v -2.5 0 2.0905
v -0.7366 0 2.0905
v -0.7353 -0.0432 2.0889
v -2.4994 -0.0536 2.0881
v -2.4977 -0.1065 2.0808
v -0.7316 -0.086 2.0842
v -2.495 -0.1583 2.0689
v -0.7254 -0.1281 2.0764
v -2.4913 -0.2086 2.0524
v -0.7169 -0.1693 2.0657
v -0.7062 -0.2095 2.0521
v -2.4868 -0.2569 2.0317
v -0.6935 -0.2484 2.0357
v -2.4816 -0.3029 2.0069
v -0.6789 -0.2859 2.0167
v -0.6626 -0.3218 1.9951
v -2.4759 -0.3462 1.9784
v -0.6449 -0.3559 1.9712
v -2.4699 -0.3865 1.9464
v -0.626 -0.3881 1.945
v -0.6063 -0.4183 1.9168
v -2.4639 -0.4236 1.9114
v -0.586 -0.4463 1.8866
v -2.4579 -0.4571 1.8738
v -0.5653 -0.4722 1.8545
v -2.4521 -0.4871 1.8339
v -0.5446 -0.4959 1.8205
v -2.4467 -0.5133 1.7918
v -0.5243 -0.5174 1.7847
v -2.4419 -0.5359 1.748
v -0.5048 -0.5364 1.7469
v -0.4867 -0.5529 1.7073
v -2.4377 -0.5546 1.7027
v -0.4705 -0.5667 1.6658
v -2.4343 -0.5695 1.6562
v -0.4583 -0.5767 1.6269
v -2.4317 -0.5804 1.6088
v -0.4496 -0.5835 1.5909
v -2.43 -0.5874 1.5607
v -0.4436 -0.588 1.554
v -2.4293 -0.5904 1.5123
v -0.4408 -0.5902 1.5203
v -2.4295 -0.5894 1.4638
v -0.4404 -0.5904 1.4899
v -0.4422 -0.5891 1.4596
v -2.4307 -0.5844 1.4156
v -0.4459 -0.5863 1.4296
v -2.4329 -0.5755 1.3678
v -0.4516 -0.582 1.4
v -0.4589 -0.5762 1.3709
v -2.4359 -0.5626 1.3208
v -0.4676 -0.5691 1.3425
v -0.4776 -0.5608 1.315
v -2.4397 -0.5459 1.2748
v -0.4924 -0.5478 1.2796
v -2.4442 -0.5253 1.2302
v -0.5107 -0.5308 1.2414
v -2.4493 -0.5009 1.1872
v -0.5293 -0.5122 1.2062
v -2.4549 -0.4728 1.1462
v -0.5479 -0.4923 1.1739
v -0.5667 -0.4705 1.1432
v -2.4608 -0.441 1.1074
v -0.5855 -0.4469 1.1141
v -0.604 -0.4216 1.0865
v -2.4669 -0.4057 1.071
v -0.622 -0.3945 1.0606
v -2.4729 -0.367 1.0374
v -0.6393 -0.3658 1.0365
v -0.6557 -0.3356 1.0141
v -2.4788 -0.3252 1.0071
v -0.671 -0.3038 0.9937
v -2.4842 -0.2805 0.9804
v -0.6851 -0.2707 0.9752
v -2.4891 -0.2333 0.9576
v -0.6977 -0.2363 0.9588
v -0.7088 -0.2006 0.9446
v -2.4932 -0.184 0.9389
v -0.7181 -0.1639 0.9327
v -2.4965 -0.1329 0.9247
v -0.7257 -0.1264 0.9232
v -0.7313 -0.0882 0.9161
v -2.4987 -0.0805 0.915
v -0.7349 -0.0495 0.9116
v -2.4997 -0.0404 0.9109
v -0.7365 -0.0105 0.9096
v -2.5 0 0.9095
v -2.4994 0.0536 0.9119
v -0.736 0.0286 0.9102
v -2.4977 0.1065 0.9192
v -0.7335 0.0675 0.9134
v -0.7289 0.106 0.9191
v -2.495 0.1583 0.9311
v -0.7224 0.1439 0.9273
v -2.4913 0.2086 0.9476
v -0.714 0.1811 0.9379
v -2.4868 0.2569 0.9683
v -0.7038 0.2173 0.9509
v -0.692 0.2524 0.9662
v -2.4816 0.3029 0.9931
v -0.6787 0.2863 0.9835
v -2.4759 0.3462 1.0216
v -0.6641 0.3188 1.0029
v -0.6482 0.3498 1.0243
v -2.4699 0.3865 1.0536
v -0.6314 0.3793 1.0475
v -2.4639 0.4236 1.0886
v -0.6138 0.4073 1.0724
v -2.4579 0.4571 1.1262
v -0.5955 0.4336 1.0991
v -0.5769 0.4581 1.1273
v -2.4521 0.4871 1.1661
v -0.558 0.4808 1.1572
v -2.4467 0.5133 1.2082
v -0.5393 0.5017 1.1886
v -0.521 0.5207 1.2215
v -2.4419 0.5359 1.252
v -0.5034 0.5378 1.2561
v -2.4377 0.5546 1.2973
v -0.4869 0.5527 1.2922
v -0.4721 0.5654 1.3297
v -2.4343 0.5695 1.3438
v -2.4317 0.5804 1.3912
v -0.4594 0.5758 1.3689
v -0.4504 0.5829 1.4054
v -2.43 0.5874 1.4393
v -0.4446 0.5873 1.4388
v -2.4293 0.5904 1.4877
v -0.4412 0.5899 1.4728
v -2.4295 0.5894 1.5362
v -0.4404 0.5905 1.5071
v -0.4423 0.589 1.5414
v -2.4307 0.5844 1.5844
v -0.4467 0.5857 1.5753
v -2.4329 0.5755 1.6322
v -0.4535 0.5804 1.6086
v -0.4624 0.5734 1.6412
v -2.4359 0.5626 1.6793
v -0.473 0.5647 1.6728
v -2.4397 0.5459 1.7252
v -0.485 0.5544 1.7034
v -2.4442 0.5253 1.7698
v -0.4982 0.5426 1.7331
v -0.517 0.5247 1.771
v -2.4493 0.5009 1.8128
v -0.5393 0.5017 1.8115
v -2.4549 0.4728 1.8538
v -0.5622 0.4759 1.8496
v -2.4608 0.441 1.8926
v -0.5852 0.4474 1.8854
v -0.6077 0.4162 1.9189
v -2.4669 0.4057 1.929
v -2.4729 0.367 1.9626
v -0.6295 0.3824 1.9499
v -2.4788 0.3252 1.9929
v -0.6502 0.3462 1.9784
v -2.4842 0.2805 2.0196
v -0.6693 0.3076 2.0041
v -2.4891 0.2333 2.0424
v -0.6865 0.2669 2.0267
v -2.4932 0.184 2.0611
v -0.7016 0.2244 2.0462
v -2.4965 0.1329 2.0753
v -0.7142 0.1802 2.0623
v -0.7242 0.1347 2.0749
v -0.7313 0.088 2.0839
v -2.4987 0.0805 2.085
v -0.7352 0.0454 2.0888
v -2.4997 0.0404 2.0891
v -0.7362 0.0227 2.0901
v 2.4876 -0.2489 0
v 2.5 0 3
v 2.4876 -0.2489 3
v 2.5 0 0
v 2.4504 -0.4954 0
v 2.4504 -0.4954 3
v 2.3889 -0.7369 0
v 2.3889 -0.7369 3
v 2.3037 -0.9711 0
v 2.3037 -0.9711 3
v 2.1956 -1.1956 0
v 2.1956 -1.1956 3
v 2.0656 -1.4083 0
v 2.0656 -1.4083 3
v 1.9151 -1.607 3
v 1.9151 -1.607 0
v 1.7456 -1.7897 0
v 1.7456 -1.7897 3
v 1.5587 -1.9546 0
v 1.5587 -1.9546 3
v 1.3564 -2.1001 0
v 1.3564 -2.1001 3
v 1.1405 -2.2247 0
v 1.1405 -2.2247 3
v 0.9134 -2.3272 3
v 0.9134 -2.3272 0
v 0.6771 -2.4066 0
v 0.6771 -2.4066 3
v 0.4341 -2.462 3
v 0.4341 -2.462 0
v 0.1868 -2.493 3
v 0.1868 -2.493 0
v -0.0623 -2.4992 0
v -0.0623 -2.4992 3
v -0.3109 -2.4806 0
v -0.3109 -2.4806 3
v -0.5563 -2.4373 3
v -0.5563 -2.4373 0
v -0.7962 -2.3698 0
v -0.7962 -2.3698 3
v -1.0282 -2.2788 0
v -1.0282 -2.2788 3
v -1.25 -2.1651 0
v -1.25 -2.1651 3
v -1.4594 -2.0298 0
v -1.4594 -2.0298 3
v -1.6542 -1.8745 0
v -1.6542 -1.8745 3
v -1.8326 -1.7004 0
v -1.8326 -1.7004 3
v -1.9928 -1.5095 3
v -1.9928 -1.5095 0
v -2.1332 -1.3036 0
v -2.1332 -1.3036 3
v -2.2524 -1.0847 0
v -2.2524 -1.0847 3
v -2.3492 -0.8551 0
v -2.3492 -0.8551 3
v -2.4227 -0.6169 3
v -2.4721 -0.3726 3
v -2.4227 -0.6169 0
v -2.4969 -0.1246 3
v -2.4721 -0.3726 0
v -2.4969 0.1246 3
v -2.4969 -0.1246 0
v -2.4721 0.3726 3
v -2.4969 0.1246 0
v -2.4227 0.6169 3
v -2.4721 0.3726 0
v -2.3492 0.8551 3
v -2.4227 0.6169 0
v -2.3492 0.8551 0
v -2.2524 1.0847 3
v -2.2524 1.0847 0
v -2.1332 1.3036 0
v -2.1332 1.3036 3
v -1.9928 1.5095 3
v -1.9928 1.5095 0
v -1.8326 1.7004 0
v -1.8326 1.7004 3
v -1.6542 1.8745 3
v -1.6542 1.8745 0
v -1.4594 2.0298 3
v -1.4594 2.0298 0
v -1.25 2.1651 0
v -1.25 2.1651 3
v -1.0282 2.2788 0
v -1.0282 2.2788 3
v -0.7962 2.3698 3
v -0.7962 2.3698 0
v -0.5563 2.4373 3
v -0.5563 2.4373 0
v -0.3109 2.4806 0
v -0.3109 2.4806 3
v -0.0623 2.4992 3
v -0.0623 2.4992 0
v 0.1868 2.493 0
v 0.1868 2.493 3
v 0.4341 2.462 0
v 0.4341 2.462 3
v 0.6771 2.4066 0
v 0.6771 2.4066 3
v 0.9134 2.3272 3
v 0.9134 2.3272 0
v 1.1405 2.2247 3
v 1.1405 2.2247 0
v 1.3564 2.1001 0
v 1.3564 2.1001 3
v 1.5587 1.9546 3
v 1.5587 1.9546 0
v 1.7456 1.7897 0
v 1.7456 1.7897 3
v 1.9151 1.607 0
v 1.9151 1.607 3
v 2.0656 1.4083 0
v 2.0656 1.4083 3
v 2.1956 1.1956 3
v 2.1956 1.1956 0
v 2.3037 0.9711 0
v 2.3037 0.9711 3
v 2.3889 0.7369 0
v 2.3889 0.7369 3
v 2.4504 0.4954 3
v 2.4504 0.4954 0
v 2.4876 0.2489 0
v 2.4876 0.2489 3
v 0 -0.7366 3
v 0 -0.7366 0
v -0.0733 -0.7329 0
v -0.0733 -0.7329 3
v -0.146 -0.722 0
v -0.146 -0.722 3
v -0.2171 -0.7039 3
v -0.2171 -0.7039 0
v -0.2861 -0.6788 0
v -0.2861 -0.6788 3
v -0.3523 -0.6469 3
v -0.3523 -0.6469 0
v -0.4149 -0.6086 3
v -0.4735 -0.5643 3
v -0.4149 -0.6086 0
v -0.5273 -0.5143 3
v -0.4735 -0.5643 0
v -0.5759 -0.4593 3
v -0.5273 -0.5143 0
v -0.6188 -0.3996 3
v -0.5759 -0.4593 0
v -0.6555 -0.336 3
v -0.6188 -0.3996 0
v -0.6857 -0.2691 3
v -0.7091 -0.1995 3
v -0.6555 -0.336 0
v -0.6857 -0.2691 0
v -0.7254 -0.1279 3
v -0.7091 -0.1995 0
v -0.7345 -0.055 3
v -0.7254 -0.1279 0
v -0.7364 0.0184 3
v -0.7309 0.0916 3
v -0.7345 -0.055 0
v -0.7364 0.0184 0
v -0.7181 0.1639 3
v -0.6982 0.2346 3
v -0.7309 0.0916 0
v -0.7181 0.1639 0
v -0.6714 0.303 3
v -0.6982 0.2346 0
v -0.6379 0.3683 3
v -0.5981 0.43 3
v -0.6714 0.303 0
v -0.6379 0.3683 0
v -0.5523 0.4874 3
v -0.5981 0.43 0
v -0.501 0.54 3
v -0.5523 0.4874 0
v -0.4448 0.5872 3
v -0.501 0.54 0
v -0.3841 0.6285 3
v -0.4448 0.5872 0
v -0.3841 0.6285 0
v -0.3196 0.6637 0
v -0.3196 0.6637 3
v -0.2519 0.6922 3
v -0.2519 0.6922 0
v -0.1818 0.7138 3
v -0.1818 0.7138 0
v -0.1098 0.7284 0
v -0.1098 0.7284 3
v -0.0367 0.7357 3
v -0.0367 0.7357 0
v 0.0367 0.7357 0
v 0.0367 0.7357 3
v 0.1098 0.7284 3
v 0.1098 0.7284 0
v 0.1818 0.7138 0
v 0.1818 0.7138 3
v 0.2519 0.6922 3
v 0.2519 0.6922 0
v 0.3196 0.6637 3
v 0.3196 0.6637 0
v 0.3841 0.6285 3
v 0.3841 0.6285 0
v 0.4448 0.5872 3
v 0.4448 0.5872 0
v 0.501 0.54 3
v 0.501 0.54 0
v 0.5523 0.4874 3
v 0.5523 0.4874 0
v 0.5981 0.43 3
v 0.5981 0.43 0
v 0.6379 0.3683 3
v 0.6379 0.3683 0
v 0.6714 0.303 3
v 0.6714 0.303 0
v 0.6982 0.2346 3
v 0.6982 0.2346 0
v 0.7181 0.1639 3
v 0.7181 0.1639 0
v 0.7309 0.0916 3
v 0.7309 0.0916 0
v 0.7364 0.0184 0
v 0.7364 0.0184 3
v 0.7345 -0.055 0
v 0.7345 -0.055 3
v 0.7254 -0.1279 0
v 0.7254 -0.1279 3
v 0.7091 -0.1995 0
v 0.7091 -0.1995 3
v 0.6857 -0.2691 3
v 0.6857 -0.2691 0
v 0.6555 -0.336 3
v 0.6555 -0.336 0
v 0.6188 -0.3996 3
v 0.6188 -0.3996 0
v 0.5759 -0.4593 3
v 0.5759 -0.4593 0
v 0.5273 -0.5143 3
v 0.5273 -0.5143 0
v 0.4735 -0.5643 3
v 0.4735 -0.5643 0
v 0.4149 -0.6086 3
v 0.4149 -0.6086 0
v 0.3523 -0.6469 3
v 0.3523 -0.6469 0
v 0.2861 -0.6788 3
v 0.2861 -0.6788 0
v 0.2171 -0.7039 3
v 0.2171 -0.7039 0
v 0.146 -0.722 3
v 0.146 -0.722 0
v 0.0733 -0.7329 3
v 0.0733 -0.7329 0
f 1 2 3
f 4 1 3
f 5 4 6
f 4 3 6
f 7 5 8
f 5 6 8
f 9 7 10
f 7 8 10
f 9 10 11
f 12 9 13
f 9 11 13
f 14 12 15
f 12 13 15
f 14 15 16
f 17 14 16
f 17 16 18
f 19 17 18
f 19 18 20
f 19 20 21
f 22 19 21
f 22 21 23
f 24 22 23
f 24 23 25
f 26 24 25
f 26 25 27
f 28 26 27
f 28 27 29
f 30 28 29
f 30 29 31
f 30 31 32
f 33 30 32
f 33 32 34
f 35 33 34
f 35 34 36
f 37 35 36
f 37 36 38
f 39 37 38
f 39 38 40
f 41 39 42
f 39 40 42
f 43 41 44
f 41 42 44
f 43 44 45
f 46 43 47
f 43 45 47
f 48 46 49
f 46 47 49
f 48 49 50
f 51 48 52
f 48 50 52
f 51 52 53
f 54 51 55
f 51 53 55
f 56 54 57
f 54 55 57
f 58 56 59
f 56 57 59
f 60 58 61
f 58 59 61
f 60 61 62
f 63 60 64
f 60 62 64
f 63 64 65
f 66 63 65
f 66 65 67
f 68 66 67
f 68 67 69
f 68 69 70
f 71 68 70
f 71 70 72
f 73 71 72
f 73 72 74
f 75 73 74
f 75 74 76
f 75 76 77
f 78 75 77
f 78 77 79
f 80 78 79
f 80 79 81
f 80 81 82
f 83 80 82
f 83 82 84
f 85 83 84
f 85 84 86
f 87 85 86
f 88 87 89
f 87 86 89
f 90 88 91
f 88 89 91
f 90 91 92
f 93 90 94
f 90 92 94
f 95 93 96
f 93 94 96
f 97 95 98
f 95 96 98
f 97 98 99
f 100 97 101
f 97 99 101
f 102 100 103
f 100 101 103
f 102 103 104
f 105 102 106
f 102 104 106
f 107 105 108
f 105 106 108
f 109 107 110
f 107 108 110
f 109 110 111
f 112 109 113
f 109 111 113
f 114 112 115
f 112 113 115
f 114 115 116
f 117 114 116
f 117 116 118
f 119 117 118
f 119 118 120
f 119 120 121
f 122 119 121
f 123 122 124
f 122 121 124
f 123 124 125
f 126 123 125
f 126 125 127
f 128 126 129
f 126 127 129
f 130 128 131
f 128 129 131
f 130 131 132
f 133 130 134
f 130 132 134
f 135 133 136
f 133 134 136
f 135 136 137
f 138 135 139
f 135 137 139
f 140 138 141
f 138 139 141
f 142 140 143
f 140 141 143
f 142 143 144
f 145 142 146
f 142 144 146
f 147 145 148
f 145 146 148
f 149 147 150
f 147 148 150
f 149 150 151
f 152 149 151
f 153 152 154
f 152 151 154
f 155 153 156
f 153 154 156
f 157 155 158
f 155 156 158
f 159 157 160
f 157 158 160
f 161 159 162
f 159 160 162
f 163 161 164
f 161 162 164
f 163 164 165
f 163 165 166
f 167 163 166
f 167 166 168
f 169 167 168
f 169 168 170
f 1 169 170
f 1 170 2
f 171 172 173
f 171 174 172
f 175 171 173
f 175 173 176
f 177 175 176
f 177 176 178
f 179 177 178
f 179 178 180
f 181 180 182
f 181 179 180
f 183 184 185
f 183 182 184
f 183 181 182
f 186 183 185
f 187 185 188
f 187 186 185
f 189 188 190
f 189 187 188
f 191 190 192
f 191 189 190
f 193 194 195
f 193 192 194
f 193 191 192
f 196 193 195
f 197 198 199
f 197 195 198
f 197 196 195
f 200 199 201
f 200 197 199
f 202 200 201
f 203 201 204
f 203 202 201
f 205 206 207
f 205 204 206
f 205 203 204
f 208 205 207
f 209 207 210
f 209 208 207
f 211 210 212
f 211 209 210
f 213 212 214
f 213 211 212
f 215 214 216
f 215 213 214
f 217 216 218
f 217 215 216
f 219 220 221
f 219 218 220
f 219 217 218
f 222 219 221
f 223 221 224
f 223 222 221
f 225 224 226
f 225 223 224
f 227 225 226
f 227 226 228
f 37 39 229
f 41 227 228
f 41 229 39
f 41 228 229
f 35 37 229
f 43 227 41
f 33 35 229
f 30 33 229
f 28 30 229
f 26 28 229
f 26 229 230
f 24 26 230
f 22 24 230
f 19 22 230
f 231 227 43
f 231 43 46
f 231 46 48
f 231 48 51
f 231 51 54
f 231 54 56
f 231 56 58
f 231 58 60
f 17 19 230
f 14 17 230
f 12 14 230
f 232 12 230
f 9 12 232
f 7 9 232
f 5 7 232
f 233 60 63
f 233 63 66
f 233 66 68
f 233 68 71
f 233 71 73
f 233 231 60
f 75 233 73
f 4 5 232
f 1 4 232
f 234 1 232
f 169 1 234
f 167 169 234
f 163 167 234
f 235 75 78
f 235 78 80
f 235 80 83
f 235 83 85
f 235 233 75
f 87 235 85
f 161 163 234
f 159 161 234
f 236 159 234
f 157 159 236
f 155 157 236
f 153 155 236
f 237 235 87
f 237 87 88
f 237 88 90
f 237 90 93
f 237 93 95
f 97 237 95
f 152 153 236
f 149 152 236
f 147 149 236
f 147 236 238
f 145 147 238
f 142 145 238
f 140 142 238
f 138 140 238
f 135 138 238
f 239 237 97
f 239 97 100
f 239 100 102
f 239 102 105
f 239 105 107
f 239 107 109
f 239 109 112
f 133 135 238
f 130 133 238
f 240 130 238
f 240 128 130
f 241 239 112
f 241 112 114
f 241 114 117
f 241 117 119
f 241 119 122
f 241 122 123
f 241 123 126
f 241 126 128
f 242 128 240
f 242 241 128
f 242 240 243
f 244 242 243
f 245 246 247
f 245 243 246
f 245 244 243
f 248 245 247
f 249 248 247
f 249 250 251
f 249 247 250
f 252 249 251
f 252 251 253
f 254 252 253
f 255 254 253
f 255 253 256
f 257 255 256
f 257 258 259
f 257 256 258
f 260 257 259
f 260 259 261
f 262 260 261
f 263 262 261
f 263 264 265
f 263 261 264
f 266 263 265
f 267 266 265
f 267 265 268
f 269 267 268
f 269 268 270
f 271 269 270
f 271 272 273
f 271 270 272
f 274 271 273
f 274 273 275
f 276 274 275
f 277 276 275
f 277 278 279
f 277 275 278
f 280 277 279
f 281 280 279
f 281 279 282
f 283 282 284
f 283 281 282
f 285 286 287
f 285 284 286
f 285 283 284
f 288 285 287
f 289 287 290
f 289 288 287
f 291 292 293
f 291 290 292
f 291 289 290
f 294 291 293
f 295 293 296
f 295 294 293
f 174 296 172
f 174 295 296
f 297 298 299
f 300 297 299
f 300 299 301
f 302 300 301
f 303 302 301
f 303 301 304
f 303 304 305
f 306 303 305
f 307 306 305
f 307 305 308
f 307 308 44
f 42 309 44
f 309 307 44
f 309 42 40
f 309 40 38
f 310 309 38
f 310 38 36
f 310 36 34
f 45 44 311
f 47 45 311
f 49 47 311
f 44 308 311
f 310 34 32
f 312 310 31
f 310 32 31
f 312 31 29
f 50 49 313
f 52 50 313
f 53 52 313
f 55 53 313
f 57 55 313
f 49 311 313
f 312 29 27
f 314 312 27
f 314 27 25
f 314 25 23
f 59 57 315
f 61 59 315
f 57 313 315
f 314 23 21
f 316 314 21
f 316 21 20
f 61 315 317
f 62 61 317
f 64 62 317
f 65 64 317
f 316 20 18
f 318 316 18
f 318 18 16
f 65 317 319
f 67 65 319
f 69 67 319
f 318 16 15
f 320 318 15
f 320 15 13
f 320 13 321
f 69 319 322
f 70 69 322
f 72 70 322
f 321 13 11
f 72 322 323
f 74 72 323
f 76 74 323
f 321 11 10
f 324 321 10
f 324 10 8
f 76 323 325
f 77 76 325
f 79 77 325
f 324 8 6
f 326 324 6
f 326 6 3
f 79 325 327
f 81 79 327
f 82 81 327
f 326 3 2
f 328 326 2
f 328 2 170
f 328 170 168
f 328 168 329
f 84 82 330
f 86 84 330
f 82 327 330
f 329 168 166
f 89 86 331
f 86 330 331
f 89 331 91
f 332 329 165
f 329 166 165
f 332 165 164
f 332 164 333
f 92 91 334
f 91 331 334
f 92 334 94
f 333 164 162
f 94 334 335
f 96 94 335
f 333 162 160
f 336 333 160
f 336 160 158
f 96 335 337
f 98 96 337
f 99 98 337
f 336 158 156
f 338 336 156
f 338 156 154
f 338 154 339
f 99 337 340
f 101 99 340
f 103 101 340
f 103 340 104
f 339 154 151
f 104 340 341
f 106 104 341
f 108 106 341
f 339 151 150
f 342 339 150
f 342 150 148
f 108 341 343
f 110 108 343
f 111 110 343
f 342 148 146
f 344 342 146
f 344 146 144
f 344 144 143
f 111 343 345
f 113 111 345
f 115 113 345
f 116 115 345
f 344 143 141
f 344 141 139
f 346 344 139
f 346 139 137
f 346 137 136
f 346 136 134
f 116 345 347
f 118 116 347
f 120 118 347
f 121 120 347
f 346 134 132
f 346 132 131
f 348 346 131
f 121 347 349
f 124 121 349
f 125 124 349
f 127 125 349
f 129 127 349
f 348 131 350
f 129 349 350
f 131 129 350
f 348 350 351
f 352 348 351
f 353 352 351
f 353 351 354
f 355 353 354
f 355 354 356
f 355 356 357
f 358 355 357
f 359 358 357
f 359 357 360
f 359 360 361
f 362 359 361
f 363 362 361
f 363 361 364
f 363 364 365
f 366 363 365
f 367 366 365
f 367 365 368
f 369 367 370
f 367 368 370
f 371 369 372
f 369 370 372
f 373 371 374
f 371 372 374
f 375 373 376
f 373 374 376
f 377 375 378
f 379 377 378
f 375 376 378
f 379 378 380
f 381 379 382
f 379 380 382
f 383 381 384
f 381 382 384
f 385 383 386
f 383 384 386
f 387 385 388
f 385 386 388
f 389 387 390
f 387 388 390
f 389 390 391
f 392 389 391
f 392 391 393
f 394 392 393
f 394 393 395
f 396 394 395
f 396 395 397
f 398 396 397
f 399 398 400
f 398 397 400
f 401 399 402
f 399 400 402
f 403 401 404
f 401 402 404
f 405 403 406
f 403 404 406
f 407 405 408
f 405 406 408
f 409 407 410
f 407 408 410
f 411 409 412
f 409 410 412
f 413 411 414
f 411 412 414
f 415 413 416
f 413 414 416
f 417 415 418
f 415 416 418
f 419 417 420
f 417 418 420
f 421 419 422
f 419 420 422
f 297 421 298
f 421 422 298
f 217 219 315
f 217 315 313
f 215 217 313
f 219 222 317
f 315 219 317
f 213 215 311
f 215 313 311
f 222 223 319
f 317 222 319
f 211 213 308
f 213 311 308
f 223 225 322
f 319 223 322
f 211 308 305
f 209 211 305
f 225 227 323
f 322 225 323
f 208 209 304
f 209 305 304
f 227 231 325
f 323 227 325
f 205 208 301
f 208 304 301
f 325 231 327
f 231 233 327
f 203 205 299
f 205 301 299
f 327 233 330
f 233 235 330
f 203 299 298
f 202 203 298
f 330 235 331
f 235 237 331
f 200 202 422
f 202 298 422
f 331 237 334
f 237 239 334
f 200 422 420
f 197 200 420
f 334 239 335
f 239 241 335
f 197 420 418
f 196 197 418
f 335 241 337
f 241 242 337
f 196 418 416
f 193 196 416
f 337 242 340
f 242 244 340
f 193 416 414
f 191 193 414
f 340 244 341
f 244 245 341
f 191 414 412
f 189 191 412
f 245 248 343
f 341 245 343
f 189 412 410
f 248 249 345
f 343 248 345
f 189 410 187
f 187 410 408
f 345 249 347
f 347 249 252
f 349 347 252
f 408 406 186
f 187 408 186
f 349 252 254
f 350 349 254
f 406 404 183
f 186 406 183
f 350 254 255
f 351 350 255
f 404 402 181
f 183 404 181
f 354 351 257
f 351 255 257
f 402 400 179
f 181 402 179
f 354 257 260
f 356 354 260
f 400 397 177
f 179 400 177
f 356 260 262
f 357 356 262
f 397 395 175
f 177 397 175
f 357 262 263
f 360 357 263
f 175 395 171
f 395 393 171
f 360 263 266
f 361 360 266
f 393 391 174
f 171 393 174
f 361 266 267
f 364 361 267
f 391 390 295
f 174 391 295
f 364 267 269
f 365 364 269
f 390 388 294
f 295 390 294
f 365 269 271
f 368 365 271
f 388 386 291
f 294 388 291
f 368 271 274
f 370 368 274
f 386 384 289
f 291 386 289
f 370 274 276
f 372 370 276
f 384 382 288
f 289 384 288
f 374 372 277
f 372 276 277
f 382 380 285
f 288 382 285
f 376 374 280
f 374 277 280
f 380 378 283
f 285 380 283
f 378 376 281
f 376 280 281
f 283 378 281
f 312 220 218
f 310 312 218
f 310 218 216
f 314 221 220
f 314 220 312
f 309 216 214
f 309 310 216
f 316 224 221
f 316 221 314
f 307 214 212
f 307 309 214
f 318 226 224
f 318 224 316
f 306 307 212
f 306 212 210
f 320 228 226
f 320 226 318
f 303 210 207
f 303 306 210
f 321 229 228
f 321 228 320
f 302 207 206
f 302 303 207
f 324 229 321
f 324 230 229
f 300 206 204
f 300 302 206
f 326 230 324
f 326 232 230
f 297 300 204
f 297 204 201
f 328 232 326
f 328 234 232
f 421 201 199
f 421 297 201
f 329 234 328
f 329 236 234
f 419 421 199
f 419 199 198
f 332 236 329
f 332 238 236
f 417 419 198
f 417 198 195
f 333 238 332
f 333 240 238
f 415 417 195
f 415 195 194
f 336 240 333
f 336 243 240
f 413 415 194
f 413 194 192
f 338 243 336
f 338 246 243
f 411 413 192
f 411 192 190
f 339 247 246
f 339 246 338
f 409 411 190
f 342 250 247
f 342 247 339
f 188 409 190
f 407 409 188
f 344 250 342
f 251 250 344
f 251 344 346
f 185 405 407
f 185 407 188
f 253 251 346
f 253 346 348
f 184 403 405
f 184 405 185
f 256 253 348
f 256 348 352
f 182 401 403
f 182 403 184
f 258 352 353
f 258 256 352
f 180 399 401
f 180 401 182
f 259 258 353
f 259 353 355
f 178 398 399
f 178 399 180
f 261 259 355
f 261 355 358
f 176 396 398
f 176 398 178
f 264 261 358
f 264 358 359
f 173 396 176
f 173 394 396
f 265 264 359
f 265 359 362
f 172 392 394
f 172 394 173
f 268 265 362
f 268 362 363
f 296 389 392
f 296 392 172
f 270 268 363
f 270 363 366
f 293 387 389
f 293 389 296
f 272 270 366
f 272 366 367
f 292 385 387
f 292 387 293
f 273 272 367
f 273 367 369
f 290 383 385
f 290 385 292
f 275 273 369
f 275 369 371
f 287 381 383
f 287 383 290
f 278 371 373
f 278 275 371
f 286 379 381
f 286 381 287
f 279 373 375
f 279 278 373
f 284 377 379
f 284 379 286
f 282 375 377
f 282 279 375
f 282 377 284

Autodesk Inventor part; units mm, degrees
ref_plane "XZ Plane" through (0, 0, 0) normal (0, 1, 0) x (-1, 0, 0)
ref_plane "XY Plane" through (0, 0, 0) normal (0, 0, 1) x (1, 0, 0)
sketch "Sketch1" plane through (0, 0, 0) normal (0, 0, 1) x (1, 0, 0)
  circle A0 centre (0, 0) radius 2.5
  dimension "d0" = 5
extrude "Extrusion1" add sketch "Sketch1" along normal blind 3
hole "Hole1" at (0, 0, 3) direction (0, 0, -1) diameter 1.4732 end through all
ref_plane "Work Plane1" through (-2.5, 0, 0) normal (1, 0, 0) x (0, 1, 0)
sketch "Sketch2" plane through (-2.5, 0, 0) normal (1, 0, 0) x (0, 1, 0)
  line L0 (-2.5, 3) -> (2.5, 3) projected
  line L1 (-2.5, 0) -> (2.5, 0) projected
  line L2 (0, -0.6) -> (0, 3.6) projected
  point P0 (0, 0)
  point P1 (0, 1.5)
  dimension "d12" = 1.5
hole "Hole2" at (-2.5, 0, 1.5) direction (1, 0, 0) diameter 1.181 depth 2.5 thread size "0-80 UNF" class "2B" standard "ANSI Unified Screw Threads"
properties part number "OCT_Adapter_Bottom"
